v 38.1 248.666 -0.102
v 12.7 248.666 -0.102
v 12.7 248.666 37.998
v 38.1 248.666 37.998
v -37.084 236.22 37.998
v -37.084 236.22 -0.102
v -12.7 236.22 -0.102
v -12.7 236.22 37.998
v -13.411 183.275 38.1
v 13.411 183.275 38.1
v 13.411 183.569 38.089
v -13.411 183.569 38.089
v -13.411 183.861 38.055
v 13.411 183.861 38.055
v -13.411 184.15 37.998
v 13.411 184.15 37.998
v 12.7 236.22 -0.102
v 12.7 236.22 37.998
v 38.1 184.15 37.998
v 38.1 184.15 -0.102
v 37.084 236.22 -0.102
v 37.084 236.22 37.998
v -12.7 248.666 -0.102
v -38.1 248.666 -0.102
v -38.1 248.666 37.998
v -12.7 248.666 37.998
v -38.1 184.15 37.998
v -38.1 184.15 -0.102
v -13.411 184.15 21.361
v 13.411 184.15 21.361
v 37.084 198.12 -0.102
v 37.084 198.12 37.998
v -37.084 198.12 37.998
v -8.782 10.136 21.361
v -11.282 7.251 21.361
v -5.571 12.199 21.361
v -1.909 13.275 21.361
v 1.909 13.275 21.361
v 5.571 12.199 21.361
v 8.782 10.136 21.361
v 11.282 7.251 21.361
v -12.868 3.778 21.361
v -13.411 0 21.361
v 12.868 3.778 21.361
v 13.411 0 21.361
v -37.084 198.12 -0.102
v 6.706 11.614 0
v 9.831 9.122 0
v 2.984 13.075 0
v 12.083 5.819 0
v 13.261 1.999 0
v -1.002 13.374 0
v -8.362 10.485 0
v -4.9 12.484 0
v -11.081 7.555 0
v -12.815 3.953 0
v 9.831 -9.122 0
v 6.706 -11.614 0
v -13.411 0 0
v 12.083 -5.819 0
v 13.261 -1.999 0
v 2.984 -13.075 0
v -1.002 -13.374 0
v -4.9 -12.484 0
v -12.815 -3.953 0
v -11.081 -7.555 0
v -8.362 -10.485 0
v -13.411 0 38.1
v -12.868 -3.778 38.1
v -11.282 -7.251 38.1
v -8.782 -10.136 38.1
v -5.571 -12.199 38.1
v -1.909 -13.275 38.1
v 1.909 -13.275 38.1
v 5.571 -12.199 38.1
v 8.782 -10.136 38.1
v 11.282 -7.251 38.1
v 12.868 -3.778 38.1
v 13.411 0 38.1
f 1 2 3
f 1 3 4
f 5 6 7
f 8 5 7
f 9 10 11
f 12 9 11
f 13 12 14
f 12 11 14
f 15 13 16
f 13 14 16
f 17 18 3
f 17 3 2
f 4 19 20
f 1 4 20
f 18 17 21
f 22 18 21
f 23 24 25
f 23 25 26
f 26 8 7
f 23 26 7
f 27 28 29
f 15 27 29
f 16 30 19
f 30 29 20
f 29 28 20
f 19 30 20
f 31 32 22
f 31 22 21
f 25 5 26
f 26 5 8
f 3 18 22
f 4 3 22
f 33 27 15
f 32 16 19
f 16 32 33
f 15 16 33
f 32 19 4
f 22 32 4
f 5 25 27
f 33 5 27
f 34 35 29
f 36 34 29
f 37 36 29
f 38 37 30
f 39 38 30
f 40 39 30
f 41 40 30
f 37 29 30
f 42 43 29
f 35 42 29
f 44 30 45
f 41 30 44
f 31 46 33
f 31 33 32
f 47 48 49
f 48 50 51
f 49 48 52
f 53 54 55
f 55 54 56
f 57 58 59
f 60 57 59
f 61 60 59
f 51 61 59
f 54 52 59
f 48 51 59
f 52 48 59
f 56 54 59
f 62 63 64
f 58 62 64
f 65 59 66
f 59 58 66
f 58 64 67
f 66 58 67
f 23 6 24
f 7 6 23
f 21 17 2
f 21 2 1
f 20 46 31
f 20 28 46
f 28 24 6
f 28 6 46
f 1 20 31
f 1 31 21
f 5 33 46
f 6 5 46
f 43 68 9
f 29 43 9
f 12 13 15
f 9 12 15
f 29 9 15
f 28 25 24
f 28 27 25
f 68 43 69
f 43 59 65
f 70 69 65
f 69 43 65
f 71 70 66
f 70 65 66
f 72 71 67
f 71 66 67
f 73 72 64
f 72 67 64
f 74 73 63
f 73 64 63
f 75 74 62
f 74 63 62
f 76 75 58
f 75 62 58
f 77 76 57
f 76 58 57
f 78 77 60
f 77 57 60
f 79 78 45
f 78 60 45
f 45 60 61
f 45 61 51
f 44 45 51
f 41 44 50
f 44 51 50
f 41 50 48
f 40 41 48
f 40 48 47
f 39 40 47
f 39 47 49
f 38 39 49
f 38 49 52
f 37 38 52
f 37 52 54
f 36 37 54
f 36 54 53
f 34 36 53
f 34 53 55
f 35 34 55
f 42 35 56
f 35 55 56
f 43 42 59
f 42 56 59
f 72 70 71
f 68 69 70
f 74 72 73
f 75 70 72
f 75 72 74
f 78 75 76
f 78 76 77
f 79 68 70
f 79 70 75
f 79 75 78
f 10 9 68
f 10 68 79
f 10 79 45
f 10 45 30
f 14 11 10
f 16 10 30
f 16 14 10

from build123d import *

# Parameters (mm, degrees)
SKETCH2_R           = 13.4112
BOSS_EXTRUDE1_DEPTH = 38.1
SKETCH5_W           = 26.8224
SKETCH5_H           = 184.15
BOSS_EXTRUDE2_DEPTH = 16.7386
SKETCH8_W           = 76.2
SKETCH8_H           = 38.1
BOSS_EXTRUDE3_DEPTH = 13.97
SKETCH9_W           = 1.016
SKETCH9_H           = 38.1
BOSS_EXTRUDE4_DEPTH = 38.1
SKETCH10_W          = 25.4
SKETCH10_H          = 38.1
BOSS_EXTRUDE5_DEPTH = 12.446
FILLET1_R           = 3.81


with BuildPart() as part:
    # Sketch2 → Boss-Extrude1 (new body)
    with BuildSketch(Plane.XY):
        with Locations(Location((0, 0, 0), (0, 0, 180))):
            Circle(SKETCH2_R)
    extrude(amount=BOSS_EXTRUDE1_DEPTH)

    # Sketch5 → Boss-Extrude2 (add)
    with BuildSketch(Plane.XY.offset(38.1)):
        with Locations((0, 92.075)):
            Rectangle(SKETCH5_W, SKETCH5_H)
    extrude(amount=-BOSS_EXTRUDE2_DEPTH)

    # Sketch8 → Boss-Extrude3 (add)
    with BuildSketch(Plane(origin=(0, 184.15, 0), x_dir=(1, 0, 0), z_dir=(0, 1, 0))):
        with Locations((0, -18.948214994)):
            Rectangle(SKETCH8_W, SKETCH8_H)
    extrude(amount=BOSS_EXTRUDE3_DEPTH)

    # Sketch9 → Boss-Extrude4 (add)
    with BuildSketch(Plane(origin=(0, 198.12, 0), x_dir=(1, 0, 0), z_dir=(0, 1, 0))):
        with Locations((-37.592, -18.948214994)):
            Rectangle(SKETCH9_W, SKETCH9_H)
        with Locations((37.592, -18.948214994)):
            Rectangle(SKETCH9_W, SKETCH9_H)
    extrude(amount=BOSS_EXTRUDE4_DEPTH)

    # Sketch10 → Boss-Extrude5 (add)
    with BuildSketch(Plane(origin=(0, 236.22, 0), x_dir=(1, 0, 0), z_dir=(0, 1, 0))):
        with Locations((-25.4, -18.948214994)):
            Rectangle(SKETCH10_W, SKETCH10_H)
        with Locations((25.4, -18.948214994)):
            Rectangle(SKETCH10_W, SKETCH10_H)
    extrude(amount=BOSS_EXTRUDE5_DEPTH)

    # Fillet1
    # the kernel refuses this fillet: 3.81 mm, written as the material it takes off along each edge
    with BuildSketch(Plane(origin=(15.598152153, 184.15, 38.1), x_dir=(0, 0, -1), z_dir=(-1, 0, 0))) as fillet1_piece_1:
        with BuildLine():
            CenterArc((3.81, 0.874780861), FILLET1_R, 180, 13.273598337)
            Line((0, 0.874780861), (-0.0762, 0.874780861))
            Line((-0.0762, 0.874780861), (-0.0762, 0))
            Line((-0.0762, 0), (0, -0.0762))
            ThreePointArc((0, -0.0762), (0.050892503, -0.0762), (0.027620706, -0.017495617))
            Line((0.027620706, -0.017495617), (0.101785006, 0))
        make_face()
    extrude(amount=31.196304306, mode=Mode.SUBTRACT)


solid = part.part
